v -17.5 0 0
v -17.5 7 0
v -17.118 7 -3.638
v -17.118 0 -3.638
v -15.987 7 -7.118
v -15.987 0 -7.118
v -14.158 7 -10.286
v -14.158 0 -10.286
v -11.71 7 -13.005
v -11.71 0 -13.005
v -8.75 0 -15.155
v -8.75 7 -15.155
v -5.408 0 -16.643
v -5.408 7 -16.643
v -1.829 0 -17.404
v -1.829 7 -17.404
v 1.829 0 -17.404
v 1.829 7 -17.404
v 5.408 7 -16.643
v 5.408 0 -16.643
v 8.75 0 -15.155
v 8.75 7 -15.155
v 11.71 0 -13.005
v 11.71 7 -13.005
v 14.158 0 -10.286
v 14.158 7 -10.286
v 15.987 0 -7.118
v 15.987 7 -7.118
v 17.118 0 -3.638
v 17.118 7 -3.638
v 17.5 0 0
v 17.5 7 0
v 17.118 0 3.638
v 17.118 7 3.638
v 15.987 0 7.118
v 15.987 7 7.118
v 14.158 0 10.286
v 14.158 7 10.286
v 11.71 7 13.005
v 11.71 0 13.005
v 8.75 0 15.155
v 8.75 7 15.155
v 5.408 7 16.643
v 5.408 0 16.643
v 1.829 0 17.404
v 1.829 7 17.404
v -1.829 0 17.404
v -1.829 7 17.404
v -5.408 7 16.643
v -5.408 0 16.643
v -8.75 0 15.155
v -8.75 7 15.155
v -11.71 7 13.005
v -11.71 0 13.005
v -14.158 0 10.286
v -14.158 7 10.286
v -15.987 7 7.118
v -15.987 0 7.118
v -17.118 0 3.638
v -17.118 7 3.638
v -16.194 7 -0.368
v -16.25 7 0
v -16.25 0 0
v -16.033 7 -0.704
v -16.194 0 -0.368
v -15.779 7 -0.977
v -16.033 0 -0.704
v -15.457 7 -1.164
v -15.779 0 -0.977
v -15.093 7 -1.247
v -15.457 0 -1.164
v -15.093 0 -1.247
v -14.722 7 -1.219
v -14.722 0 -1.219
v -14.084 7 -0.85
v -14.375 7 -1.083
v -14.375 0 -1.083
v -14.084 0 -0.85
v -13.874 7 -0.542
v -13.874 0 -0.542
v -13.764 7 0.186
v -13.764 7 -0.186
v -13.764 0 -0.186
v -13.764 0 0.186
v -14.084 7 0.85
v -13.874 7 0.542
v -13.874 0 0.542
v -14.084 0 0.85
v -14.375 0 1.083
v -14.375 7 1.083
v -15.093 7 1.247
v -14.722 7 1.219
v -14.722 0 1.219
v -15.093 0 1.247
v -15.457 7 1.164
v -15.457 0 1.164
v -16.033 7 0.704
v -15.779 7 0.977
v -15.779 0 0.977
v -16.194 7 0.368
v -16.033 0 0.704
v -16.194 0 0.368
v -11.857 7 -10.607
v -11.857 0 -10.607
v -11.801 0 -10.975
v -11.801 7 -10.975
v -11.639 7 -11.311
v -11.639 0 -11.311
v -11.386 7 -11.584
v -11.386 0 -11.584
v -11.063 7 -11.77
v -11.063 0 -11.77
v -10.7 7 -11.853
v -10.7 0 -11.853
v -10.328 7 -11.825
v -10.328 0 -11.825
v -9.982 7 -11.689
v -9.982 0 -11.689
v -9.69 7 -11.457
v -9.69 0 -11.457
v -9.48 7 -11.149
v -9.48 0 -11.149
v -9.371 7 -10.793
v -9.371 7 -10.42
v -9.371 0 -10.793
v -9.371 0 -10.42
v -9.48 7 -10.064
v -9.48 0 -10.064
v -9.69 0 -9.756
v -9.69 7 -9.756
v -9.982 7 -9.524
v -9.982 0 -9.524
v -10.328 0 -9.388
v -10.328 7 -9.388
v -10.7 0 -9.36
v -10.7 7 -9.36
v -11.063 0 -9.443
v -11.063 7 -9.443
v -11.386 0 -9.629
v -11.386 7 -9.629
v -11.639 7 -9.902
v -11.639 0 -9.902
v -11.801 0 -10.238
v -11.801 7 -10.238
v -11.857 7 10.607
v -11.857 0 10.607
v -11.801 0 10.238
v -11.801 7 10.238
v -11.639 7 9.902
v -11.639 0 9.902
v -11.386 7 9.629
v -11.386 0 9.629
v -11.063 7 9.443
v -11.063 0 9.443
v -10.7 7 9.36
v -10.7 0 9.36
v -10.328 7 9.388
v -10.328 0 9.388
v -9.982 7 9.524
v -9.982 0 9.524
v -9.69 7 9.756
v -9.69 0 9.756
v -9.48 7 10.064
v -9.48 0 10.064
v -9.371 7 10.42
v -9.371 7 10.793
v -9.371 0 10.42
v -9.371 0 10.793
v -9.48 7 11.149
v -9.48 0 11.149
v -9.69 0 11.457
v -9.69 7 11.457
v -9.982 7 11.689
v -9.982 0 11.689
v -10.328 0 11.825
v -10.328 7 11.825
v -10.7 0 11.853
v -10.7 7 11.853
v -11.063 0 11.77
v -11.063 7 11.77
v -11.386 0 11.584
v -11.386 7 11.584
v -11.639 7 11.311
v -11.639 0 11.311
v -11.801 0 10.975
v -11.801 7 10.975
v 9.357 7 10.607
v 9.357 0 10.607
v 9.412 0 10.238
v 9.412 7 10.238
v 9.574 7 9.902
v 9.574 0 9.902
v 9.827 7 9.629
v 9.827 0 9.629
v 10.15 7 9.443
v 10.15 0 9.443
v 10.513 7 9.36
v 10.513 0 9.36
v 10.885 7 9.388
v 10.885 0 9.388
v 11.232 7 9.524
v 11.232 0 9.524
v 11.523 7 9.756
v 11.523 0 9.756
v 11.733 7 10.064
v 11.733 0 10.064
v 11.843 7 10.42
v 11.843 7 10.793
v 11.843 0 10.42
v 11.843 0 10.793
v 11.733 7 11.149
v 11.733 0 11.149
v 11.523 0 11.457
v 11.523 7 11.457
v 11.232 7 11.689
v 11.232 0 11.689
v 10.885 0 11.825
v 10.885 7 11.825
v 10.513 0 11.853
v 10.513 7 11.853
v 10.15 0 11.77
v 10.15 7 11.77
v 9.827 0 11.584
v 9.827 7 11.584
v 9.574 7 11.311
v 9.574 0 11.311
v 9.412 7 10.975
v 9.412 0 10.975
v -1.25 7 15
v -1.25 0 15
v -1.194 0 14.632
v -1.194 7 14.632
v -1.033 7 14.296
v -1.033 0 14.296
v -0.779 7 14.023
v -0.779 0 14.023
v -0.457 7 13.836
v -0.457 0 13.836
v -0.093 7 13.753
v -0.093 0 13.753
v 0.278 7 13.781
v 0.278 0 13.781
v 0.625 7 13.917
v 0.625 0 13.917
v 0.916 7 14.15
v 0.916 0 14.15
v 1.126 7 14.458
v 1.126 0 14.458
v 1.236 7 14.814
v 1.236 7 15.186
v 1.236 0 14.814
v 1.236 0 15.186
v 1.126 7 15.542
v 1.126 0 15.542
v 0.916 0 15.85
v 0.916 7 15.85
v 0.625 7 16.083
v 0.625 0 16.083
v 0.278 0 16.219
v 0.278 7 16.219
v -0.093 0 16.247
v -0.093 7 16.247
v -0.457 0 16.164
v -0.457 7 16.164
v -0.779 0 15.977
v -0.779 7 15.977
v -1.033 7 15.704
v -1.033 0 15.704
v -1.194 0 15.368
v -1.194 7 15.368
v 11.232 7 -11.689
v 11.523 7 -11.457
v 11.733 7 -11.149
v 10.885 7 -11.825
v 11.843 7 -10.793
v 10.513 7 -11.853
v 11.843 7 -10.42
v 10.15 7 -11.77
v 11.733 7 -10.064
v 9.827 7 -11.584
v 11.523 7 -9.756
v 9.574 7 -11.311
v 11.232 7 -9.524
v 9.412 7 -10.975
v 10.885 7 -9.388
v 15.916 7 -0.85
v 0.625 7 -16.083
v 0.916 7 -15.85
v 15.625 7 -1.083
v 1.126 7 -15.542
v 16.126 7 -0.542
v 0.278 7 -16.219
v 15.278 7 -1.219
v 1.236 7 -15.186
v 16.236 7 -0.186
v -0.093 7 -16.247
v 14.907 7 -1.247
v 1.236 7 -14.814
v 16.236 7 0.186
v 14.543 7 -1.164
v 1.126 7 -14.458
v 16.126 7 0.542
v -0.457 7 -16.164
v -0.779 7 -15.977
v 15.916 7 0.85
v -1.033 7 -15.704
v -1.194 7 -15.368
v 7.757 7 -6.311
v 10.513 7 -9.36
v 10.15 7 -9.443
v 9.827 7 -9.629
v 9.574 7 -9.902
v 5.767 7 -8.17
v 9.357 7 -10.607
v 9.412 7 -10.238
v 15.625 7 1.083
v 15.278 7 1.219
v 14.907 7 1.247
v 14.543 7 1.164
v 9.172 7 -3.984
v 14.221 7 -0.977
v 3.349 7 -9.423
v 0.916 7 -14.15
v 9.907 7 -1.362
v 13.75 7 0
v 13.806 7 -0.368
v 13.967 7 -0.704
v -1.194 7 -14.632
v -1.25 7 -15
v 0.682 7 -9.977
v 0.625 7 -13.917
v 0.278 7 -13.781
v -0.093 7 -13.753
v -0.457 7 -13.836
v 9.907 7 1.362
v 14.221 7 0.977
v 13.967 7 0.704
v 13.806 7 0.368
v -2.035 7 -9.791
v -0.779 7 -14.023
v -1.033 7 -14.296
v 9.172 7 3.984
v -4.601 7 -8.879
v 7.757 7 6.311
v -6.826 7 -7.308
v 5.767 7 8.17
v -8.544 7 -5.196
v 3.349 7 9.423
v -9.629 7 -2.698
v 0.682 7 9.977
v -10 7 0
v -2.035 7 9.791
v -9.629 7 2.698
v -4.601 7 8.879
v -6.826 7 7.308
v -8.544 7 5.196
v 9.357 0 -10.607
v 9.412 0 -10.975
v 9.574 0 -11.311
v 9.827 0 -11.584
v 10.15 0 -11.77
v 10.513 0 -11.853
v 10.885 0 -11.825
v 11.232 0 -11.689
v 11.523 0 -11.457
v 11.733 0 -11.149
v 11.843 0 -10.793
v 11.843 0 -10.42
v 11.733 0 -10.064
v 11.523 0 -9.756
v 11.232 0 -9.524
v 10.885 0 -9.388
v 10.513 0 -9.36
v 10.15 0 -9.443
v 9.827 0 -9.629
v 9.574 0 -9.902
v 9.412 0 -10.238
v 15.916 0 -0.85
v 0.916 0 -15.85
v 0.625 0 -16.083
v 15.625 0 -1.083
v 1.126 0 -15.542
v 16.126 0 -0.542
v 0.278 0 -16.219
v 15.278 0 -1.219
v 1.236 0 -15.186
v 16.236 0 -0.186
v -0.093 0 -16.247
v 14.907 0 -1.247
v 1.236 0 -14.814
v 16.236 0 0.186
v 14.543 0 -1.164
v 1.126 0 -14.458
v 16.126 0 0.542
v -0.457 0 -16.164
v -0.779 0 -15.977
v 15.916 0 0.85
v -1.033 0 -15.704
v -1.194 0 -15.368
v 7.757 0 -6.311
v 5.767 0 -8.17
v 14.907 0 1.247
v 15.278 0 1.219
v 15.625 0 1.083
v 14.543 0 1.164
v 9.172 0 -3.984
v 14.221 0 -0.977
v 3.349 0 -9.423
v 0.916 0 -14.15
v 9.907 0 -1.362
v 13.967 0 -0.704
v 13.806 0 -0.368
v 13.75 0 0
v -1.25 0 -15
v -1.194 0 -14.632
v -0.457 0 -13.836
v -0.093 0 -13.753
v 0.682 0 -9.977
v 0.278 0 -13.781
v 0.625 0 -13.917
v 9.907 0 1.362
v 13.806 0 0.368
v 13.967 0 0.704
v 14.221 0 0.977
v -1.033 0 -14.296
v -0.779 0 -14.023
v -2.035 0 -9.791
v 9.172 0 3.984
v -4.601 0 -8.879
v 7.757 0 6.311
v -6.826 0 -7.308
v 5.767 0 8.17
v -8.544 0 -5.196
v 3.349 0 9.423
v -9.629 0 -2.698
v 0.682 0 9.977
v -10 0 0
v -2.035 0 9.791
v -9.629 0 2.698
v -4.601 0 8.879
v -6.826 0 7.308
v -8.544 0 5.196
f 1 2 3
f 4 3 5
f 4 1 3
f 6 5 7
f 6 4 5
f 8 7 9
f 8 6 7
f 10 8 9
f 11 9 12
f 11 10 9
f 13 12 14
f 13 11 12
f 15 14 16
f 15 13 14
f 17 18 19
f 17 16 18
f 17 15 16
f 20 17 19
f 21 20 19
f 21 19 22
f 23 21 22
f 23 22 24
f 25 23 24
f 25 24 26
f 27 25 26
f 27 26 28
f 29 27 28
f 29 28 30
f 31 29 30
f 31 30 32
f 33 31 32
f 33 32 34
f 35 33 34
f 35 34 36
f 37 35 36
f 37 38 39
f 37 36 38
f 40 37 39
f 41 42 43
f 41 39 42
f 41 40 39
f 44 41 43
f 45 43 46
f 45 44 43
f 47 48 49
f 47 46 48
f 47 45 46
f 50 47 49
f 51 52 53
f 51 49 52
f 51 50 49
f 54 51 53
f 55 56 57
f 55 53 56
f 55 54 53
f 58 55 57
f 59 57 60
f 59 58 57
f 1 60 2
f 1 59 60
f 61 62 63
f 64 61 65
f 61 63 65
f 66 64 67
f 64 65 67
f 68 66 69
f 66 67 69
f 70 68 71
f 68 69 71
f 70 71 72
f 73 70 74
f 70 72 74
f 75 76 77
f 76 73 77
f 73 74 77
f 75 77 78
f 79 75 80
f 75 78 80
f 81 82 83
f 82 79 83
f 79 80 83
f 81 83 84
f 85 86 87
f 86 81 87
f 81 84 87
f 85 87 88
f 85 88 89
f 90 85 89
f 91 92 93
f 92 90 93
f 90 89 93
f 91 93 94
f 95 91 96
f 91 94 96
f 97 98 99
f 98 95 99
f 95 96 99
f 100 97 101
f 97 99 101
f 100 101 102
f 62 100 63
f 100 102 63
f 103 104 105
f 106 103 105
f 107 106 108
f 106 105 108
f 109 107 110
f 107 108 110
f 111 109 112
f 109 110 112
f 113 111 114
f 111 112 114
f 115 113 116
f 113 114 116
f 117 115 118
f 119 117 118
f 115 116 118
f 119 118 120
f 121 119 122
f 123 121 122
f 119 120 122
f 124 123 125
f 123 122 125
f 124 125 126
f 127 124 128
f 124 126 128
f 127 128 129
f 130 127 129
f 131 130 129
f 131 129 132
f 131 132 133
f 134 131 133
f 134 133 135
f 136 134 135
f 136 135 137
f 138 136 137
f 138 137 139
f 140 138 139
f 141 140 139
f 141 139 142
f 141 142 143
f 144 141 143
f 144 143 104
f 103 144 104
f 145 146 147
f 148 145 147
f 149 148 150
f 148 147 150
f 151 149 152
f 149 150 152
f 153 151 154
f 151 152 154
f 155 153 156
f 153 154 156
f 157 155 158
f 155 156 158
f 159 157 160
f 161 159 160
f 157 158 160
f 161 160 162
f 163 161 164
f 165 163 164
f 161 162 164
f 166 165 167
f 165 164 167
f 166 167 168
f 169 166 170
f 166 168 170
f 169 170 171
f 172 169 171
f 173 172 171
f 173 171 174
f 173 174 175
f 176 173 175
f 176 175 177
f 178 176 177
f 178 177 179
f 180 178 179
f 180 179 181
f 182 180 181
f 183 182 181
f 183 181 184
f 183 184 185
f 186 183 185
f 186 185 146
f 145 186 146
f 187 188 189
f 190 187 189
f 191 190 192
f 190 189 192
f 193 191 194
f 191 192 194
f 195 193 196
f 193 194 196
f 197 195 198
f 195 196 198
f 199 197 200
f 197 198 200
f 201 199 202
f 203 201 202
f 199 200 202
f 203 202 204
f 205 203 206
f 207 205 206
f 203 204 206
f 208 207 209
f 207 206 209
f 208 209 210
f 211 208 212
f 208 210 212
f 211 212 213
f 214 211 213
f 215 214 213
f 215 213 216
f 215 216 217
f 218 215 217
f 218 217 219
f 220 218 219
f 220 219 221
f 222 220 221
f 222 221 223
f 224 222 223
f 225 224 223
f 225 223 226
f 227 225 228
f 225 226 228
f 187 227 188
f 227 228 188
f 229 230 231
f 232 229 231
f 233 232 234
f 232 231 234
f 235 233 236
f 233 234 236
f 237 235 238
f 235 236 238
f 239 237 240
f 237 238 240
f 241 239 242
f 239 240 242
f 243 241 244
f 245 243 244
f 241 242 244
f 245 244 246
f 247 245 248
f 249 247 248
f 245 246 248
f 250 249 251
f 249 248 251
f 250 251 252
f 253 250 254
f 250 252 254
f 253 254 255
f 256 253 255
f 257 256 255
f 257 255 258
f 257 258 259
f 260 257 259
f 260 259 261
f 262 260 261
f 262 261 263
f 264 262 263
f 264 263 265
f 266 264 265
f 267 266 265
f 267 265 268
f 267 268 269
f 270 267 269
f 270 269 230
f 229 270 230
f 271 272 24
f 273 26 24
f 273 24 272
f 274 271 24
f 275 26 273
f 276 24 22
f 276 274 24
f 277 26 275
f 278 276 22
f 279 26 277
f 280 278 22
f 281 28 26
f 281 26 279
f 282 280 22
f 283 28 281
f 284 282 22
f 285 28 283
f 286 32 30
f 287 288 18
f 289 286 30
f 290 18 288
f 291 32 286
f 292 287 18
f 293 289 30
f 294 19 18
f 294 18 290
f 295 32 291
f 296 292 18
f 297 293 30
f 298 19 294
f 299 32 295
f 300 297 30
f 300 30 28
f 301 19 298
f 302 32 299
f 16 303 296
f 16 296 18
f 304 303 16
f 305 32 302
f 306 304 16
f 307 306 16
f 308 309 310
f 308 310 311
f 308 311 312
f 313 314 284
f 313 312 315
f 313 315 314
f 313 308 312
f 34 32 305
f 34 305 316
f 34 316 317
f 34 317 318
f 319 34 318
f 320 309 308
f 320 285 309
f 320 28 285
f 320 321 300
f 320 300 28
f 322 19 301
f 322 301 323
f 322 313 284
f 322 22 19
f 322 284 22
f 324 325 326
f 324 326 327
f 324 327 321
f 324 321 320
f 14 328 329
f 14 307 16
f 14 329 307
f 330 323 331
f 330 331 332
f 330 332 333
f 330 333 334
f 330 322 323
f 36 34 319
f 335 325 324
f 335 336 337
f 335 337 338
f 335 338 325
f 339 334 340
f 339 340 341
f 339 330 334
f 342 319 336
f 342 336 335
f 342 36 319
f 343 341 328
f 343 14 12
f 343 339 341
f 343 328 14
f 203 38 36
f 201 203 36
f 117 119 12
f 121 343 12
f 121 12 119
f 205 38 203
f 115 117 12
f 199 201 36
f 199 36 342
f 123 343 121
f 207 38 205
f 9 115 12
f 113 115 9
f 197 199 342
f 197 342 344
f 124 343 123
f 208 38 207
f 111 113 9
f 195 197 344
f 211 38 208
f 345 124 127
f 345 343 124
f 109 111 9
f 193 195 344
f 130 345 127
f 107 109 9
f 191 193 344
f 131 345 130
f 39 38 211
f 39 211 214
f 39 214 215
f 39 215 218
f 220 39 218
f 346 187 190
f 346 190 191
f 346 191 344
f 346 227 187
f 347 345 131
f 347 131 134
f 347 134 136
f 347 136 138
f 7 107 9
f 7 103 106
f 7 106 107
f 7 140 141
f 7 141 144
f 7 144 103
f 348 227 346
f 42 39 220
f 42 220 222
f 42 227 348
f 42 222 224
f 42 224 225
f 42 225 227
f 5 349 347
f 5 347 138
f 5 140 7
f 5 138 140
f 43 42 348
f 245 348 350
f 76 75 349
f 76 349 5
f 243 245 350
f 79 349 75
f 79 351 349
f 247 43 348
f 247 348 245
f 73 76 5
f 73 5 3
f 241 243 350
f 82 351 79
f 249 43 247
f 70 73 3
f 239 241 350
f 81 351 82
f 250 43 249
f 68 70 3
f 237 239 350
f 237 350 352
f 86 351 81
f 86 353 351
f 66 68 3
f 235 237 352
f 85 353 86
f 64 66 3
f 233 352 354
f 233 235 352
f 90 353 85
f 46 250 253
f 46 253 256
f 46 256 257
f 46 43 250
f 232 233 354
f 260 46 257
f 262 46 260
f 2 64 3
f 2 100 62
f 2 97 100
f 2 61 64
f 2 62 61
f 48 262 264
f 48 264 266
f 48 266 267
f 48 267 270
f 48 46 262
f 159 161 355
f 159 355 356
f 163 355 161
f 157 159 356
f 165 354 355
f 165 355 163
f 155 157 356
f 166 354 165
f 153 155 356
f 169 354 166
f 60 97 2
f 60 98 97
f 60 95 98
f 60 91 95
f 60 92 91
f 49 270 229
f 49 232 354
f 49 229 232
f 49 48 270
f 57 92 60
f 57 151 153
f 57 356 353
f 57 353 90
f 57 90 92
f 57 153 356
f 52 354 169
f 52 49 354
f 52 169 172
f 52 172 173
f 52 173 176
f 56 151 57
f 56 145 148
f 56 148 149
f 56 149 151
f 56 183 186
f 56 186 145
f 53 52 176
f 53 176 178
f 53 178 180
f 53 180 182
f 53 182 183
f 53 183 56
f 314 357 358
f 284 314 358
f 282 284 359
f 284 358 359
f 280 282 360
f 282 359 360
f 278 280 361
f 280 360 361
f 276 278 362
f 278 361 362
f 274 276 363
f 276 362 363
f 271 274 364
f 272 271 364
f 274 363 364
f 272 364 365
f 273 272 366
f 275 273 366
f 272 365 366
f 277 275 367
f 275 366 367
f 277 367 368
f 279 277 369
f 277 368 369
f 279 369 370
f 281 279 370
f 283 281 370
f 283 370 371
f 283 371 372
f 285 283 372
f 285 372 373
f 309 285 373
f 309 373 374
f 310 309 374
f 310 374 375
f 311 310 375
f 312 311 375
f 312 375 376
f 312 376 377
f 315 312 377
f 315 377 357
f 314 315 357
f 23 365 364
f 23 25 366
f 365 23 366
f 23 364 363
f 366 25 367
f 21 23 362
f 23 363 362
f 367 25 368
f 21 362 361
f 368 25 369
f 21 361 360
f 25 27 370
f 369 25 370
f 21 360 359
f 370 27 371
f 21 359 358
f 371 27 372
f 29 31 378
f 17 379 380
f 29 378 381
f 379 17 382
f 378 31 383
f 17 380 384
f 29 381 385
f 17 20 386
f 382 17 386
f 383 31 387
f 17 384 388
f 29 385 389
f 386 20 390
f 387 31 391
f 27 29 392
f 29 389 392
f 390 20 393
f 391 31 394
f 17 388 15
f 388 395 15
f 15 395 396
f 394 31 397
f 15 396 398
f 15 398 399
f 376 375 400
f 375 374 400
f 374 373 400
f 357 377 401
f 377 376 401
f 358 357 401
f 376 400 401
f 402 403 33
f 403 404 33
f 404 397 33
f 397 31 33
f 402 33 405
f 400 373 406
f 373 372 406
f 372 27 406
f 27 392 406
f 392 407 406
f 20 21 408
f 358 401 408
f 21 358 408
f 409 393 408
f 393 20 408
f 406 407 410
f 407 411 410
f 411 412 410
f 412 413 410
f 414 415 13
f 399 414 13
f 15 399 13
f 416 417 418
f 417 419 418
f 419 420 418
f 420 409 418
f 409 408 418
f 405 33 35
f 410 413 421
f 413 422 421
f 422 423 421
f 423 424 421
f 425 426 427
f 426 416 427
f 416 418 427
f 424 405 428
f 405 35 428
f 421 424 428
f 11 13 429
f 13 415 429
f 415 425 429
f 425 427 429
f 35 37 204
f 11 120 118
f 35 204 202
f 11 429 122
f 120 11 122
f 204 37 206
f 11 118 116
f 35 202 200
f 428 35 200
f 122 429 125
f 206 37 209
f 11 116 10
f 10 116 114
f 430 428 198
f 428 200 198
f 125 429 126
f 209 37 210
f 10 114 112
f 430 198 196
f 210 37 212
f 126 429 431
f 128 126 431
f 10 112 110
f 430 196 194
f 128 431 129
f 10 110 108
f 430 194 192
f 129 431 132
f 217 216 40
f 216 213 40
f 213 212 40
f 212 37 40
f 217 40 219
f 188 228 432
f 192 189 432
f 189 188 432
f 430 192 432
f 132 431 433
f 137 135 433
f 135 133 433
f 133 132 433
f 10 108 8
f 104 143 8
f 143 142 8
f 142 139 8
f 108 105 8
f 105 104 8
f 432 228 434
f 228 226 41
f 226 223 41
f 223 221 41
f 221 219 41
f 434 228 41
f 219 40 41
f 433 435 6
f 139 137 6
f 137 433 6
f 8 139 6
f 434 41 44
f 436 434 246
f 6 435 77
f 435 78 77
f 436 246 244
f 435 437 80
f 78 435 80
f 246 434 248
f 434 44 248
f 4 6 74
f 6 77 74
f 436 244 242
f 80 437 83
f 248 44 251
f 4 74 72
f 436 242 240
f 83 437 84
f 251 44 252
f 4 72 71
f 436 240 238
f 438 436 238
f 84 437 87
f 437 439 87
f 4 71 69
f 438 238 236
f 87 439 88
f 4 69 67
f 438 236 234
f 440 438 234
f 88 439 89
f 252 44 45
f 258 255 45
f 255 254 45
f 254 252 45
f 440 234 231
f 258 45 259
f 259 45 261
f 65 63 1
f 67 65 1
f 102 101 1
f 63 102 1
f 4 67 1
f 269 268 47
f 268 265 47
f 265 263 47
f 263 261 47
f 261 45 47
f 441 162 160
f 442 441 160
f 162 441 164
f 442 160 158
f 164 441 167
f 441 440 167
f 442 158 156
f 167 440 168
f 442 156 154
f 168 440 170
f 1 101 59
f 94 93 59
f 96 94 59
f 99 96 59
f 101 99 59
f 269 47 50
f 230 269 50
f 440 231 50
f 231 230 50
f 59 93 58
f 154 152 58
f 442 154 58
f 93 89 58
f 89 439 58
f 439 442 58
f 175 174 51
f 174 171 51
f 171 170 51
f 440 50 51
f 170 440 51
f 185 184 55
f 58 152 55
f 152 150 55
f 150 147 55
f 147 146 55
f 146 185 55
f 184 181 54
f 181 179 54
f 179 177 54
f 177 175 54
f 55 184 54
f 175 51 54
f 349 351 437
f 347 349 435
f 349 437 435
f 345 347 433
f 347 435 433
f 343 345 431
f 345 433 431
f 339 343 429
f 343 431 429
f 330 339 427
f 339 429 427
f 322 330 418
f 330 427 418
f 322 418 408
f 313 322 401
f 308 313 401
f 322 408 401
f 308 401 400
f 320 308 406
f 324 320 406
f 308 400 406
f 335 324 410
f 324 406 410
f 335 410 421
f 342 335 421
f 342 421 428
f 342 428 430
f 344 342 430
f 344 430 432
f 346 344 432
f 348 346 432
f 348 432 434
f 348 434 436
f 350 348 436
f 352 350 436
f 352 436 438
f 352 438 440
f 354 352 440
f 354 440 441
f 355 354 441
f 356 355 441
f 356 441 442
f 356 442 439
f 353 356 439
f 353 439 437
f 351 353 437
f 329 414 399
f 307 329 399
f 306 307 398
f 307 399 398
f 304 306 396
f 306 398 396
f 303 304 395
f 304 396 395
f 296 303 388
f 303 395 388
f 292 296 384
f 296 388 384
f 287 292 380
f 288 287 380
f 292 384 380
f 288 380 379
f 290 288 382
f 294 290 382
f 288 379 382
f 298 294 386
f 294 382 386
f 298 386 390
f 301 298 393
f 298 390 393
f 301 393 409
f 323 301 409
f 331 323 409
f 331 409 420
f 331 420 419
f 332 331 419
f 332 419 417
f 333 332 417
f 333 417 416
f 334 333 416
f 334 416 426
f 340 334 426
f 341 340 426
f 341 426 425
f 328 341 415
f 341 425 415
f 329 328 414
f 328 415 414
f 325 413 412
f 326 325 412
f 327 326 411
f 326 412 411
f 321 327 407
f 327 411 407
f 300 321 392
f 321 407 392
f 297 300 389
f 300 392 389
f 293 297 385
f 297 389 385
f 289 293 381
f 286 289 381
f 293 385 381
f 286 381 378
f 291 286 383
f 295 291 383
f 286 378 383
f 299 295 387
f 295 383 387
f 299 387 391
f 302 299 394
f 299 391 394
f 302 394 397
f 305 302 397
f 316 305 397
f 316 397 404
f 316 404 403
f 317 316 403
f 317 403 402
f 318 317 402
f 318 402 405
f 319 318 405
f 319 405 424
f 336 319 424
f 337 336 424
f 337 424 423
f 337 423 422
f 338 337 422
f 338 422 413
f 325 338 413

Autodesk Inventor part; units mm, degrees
ref_plane "YZ Plane" through (0, 0, 0) normal (1, 0, 0) x (0, 1, 0)
ref_plane "XZ Plane" through (0, 0, 0) normal (0, 1, 0) x (-1, 0, 0)
ref_plane "XY Plane" through (0, 0, 0) normal (0, 0, 1) x (1, 0, 0)
sketch "Szkic1" plane through (0, 0, 0) normal (0, 1, 0) x (-1, 0, 0)
  circle A0 centre (0, 0) radius 10
  circle A1 centre (0, 0) radius 17.5
  line L0 (0, 17.5) -> (0, -17.5)
  line L1 (-17.5, 0) -> (17.5, 0)
  circle A2 centre (2.5, 2.5) radius 0.5
  circle A3 centre (2.5, -2.5) radius 0.5
  circle A4 centre (-2.5, 2.5) radius 0.5
  circle A5 centre (-2.5, -2.5) radius 0.5
  circle A6 centre (0, 15) radius 1.25
  circle A7 centre (0, -15) radius 1.25
  circle A8 centre (15, 0) radius 1.25
  circle A9 centre (-15, 0) radius 1.25
  line L2 (-2.5, -2.5) -> (-12.3744, -12.3744)
  line L3 (2.5, 2.5) -> (12.3744, 12.3744)
  line L4 (2.5, -2.5) -> (12.3744, -12.3744)
  line L5 (-2.5, 2.5) -> (-12.3744, 12.3744)
  circle A10 centre (10.6066, 10.6066) radius 1.25
  circle A11 centre (-10.6066, -10.6066) radius 1.25
  line L6 (-2.5, 2.5) -> (2.5, -2.5)
  line L7 (2.5, 2.5) -> (-2.5, -2.5)
  circle A12 centre (-10.6066, 10.6066) radius 1.25
  circle A13 centre (10.6066, -10.6066) radius 1.25
  dimension "d1" = 35
  dimension "d0" = 20
  dimension "d2" = 1
  dimension "d3" = 5
  dimension "d4" = 5
  dimension "d5" = 30
  dimension "d6" = 2.5
  dimension "d7" = 30
  dimension "d8" = 2.5
  dimension "d9" = 2.5
  dimension "d11" = 21.2132
extrude "Wyciągnięcie proste2" add sketch "Szkic1" along normal blind 7 contours L1 A8 A1 L4 A13 A0 | A0 L3 A10 A1 L1 A8 | A0 L0 A6 A1 L3 A10 | L4 A13 A1 L0 A7 A0 | A0 L5 A12 A1 L0 A6 | L0 A7 A1 L2 A11 A0 | L1 A9 A1 L5 A12 A0 | A0 L2 A11 A1 L1 A9
properties part number "doormy gora"
